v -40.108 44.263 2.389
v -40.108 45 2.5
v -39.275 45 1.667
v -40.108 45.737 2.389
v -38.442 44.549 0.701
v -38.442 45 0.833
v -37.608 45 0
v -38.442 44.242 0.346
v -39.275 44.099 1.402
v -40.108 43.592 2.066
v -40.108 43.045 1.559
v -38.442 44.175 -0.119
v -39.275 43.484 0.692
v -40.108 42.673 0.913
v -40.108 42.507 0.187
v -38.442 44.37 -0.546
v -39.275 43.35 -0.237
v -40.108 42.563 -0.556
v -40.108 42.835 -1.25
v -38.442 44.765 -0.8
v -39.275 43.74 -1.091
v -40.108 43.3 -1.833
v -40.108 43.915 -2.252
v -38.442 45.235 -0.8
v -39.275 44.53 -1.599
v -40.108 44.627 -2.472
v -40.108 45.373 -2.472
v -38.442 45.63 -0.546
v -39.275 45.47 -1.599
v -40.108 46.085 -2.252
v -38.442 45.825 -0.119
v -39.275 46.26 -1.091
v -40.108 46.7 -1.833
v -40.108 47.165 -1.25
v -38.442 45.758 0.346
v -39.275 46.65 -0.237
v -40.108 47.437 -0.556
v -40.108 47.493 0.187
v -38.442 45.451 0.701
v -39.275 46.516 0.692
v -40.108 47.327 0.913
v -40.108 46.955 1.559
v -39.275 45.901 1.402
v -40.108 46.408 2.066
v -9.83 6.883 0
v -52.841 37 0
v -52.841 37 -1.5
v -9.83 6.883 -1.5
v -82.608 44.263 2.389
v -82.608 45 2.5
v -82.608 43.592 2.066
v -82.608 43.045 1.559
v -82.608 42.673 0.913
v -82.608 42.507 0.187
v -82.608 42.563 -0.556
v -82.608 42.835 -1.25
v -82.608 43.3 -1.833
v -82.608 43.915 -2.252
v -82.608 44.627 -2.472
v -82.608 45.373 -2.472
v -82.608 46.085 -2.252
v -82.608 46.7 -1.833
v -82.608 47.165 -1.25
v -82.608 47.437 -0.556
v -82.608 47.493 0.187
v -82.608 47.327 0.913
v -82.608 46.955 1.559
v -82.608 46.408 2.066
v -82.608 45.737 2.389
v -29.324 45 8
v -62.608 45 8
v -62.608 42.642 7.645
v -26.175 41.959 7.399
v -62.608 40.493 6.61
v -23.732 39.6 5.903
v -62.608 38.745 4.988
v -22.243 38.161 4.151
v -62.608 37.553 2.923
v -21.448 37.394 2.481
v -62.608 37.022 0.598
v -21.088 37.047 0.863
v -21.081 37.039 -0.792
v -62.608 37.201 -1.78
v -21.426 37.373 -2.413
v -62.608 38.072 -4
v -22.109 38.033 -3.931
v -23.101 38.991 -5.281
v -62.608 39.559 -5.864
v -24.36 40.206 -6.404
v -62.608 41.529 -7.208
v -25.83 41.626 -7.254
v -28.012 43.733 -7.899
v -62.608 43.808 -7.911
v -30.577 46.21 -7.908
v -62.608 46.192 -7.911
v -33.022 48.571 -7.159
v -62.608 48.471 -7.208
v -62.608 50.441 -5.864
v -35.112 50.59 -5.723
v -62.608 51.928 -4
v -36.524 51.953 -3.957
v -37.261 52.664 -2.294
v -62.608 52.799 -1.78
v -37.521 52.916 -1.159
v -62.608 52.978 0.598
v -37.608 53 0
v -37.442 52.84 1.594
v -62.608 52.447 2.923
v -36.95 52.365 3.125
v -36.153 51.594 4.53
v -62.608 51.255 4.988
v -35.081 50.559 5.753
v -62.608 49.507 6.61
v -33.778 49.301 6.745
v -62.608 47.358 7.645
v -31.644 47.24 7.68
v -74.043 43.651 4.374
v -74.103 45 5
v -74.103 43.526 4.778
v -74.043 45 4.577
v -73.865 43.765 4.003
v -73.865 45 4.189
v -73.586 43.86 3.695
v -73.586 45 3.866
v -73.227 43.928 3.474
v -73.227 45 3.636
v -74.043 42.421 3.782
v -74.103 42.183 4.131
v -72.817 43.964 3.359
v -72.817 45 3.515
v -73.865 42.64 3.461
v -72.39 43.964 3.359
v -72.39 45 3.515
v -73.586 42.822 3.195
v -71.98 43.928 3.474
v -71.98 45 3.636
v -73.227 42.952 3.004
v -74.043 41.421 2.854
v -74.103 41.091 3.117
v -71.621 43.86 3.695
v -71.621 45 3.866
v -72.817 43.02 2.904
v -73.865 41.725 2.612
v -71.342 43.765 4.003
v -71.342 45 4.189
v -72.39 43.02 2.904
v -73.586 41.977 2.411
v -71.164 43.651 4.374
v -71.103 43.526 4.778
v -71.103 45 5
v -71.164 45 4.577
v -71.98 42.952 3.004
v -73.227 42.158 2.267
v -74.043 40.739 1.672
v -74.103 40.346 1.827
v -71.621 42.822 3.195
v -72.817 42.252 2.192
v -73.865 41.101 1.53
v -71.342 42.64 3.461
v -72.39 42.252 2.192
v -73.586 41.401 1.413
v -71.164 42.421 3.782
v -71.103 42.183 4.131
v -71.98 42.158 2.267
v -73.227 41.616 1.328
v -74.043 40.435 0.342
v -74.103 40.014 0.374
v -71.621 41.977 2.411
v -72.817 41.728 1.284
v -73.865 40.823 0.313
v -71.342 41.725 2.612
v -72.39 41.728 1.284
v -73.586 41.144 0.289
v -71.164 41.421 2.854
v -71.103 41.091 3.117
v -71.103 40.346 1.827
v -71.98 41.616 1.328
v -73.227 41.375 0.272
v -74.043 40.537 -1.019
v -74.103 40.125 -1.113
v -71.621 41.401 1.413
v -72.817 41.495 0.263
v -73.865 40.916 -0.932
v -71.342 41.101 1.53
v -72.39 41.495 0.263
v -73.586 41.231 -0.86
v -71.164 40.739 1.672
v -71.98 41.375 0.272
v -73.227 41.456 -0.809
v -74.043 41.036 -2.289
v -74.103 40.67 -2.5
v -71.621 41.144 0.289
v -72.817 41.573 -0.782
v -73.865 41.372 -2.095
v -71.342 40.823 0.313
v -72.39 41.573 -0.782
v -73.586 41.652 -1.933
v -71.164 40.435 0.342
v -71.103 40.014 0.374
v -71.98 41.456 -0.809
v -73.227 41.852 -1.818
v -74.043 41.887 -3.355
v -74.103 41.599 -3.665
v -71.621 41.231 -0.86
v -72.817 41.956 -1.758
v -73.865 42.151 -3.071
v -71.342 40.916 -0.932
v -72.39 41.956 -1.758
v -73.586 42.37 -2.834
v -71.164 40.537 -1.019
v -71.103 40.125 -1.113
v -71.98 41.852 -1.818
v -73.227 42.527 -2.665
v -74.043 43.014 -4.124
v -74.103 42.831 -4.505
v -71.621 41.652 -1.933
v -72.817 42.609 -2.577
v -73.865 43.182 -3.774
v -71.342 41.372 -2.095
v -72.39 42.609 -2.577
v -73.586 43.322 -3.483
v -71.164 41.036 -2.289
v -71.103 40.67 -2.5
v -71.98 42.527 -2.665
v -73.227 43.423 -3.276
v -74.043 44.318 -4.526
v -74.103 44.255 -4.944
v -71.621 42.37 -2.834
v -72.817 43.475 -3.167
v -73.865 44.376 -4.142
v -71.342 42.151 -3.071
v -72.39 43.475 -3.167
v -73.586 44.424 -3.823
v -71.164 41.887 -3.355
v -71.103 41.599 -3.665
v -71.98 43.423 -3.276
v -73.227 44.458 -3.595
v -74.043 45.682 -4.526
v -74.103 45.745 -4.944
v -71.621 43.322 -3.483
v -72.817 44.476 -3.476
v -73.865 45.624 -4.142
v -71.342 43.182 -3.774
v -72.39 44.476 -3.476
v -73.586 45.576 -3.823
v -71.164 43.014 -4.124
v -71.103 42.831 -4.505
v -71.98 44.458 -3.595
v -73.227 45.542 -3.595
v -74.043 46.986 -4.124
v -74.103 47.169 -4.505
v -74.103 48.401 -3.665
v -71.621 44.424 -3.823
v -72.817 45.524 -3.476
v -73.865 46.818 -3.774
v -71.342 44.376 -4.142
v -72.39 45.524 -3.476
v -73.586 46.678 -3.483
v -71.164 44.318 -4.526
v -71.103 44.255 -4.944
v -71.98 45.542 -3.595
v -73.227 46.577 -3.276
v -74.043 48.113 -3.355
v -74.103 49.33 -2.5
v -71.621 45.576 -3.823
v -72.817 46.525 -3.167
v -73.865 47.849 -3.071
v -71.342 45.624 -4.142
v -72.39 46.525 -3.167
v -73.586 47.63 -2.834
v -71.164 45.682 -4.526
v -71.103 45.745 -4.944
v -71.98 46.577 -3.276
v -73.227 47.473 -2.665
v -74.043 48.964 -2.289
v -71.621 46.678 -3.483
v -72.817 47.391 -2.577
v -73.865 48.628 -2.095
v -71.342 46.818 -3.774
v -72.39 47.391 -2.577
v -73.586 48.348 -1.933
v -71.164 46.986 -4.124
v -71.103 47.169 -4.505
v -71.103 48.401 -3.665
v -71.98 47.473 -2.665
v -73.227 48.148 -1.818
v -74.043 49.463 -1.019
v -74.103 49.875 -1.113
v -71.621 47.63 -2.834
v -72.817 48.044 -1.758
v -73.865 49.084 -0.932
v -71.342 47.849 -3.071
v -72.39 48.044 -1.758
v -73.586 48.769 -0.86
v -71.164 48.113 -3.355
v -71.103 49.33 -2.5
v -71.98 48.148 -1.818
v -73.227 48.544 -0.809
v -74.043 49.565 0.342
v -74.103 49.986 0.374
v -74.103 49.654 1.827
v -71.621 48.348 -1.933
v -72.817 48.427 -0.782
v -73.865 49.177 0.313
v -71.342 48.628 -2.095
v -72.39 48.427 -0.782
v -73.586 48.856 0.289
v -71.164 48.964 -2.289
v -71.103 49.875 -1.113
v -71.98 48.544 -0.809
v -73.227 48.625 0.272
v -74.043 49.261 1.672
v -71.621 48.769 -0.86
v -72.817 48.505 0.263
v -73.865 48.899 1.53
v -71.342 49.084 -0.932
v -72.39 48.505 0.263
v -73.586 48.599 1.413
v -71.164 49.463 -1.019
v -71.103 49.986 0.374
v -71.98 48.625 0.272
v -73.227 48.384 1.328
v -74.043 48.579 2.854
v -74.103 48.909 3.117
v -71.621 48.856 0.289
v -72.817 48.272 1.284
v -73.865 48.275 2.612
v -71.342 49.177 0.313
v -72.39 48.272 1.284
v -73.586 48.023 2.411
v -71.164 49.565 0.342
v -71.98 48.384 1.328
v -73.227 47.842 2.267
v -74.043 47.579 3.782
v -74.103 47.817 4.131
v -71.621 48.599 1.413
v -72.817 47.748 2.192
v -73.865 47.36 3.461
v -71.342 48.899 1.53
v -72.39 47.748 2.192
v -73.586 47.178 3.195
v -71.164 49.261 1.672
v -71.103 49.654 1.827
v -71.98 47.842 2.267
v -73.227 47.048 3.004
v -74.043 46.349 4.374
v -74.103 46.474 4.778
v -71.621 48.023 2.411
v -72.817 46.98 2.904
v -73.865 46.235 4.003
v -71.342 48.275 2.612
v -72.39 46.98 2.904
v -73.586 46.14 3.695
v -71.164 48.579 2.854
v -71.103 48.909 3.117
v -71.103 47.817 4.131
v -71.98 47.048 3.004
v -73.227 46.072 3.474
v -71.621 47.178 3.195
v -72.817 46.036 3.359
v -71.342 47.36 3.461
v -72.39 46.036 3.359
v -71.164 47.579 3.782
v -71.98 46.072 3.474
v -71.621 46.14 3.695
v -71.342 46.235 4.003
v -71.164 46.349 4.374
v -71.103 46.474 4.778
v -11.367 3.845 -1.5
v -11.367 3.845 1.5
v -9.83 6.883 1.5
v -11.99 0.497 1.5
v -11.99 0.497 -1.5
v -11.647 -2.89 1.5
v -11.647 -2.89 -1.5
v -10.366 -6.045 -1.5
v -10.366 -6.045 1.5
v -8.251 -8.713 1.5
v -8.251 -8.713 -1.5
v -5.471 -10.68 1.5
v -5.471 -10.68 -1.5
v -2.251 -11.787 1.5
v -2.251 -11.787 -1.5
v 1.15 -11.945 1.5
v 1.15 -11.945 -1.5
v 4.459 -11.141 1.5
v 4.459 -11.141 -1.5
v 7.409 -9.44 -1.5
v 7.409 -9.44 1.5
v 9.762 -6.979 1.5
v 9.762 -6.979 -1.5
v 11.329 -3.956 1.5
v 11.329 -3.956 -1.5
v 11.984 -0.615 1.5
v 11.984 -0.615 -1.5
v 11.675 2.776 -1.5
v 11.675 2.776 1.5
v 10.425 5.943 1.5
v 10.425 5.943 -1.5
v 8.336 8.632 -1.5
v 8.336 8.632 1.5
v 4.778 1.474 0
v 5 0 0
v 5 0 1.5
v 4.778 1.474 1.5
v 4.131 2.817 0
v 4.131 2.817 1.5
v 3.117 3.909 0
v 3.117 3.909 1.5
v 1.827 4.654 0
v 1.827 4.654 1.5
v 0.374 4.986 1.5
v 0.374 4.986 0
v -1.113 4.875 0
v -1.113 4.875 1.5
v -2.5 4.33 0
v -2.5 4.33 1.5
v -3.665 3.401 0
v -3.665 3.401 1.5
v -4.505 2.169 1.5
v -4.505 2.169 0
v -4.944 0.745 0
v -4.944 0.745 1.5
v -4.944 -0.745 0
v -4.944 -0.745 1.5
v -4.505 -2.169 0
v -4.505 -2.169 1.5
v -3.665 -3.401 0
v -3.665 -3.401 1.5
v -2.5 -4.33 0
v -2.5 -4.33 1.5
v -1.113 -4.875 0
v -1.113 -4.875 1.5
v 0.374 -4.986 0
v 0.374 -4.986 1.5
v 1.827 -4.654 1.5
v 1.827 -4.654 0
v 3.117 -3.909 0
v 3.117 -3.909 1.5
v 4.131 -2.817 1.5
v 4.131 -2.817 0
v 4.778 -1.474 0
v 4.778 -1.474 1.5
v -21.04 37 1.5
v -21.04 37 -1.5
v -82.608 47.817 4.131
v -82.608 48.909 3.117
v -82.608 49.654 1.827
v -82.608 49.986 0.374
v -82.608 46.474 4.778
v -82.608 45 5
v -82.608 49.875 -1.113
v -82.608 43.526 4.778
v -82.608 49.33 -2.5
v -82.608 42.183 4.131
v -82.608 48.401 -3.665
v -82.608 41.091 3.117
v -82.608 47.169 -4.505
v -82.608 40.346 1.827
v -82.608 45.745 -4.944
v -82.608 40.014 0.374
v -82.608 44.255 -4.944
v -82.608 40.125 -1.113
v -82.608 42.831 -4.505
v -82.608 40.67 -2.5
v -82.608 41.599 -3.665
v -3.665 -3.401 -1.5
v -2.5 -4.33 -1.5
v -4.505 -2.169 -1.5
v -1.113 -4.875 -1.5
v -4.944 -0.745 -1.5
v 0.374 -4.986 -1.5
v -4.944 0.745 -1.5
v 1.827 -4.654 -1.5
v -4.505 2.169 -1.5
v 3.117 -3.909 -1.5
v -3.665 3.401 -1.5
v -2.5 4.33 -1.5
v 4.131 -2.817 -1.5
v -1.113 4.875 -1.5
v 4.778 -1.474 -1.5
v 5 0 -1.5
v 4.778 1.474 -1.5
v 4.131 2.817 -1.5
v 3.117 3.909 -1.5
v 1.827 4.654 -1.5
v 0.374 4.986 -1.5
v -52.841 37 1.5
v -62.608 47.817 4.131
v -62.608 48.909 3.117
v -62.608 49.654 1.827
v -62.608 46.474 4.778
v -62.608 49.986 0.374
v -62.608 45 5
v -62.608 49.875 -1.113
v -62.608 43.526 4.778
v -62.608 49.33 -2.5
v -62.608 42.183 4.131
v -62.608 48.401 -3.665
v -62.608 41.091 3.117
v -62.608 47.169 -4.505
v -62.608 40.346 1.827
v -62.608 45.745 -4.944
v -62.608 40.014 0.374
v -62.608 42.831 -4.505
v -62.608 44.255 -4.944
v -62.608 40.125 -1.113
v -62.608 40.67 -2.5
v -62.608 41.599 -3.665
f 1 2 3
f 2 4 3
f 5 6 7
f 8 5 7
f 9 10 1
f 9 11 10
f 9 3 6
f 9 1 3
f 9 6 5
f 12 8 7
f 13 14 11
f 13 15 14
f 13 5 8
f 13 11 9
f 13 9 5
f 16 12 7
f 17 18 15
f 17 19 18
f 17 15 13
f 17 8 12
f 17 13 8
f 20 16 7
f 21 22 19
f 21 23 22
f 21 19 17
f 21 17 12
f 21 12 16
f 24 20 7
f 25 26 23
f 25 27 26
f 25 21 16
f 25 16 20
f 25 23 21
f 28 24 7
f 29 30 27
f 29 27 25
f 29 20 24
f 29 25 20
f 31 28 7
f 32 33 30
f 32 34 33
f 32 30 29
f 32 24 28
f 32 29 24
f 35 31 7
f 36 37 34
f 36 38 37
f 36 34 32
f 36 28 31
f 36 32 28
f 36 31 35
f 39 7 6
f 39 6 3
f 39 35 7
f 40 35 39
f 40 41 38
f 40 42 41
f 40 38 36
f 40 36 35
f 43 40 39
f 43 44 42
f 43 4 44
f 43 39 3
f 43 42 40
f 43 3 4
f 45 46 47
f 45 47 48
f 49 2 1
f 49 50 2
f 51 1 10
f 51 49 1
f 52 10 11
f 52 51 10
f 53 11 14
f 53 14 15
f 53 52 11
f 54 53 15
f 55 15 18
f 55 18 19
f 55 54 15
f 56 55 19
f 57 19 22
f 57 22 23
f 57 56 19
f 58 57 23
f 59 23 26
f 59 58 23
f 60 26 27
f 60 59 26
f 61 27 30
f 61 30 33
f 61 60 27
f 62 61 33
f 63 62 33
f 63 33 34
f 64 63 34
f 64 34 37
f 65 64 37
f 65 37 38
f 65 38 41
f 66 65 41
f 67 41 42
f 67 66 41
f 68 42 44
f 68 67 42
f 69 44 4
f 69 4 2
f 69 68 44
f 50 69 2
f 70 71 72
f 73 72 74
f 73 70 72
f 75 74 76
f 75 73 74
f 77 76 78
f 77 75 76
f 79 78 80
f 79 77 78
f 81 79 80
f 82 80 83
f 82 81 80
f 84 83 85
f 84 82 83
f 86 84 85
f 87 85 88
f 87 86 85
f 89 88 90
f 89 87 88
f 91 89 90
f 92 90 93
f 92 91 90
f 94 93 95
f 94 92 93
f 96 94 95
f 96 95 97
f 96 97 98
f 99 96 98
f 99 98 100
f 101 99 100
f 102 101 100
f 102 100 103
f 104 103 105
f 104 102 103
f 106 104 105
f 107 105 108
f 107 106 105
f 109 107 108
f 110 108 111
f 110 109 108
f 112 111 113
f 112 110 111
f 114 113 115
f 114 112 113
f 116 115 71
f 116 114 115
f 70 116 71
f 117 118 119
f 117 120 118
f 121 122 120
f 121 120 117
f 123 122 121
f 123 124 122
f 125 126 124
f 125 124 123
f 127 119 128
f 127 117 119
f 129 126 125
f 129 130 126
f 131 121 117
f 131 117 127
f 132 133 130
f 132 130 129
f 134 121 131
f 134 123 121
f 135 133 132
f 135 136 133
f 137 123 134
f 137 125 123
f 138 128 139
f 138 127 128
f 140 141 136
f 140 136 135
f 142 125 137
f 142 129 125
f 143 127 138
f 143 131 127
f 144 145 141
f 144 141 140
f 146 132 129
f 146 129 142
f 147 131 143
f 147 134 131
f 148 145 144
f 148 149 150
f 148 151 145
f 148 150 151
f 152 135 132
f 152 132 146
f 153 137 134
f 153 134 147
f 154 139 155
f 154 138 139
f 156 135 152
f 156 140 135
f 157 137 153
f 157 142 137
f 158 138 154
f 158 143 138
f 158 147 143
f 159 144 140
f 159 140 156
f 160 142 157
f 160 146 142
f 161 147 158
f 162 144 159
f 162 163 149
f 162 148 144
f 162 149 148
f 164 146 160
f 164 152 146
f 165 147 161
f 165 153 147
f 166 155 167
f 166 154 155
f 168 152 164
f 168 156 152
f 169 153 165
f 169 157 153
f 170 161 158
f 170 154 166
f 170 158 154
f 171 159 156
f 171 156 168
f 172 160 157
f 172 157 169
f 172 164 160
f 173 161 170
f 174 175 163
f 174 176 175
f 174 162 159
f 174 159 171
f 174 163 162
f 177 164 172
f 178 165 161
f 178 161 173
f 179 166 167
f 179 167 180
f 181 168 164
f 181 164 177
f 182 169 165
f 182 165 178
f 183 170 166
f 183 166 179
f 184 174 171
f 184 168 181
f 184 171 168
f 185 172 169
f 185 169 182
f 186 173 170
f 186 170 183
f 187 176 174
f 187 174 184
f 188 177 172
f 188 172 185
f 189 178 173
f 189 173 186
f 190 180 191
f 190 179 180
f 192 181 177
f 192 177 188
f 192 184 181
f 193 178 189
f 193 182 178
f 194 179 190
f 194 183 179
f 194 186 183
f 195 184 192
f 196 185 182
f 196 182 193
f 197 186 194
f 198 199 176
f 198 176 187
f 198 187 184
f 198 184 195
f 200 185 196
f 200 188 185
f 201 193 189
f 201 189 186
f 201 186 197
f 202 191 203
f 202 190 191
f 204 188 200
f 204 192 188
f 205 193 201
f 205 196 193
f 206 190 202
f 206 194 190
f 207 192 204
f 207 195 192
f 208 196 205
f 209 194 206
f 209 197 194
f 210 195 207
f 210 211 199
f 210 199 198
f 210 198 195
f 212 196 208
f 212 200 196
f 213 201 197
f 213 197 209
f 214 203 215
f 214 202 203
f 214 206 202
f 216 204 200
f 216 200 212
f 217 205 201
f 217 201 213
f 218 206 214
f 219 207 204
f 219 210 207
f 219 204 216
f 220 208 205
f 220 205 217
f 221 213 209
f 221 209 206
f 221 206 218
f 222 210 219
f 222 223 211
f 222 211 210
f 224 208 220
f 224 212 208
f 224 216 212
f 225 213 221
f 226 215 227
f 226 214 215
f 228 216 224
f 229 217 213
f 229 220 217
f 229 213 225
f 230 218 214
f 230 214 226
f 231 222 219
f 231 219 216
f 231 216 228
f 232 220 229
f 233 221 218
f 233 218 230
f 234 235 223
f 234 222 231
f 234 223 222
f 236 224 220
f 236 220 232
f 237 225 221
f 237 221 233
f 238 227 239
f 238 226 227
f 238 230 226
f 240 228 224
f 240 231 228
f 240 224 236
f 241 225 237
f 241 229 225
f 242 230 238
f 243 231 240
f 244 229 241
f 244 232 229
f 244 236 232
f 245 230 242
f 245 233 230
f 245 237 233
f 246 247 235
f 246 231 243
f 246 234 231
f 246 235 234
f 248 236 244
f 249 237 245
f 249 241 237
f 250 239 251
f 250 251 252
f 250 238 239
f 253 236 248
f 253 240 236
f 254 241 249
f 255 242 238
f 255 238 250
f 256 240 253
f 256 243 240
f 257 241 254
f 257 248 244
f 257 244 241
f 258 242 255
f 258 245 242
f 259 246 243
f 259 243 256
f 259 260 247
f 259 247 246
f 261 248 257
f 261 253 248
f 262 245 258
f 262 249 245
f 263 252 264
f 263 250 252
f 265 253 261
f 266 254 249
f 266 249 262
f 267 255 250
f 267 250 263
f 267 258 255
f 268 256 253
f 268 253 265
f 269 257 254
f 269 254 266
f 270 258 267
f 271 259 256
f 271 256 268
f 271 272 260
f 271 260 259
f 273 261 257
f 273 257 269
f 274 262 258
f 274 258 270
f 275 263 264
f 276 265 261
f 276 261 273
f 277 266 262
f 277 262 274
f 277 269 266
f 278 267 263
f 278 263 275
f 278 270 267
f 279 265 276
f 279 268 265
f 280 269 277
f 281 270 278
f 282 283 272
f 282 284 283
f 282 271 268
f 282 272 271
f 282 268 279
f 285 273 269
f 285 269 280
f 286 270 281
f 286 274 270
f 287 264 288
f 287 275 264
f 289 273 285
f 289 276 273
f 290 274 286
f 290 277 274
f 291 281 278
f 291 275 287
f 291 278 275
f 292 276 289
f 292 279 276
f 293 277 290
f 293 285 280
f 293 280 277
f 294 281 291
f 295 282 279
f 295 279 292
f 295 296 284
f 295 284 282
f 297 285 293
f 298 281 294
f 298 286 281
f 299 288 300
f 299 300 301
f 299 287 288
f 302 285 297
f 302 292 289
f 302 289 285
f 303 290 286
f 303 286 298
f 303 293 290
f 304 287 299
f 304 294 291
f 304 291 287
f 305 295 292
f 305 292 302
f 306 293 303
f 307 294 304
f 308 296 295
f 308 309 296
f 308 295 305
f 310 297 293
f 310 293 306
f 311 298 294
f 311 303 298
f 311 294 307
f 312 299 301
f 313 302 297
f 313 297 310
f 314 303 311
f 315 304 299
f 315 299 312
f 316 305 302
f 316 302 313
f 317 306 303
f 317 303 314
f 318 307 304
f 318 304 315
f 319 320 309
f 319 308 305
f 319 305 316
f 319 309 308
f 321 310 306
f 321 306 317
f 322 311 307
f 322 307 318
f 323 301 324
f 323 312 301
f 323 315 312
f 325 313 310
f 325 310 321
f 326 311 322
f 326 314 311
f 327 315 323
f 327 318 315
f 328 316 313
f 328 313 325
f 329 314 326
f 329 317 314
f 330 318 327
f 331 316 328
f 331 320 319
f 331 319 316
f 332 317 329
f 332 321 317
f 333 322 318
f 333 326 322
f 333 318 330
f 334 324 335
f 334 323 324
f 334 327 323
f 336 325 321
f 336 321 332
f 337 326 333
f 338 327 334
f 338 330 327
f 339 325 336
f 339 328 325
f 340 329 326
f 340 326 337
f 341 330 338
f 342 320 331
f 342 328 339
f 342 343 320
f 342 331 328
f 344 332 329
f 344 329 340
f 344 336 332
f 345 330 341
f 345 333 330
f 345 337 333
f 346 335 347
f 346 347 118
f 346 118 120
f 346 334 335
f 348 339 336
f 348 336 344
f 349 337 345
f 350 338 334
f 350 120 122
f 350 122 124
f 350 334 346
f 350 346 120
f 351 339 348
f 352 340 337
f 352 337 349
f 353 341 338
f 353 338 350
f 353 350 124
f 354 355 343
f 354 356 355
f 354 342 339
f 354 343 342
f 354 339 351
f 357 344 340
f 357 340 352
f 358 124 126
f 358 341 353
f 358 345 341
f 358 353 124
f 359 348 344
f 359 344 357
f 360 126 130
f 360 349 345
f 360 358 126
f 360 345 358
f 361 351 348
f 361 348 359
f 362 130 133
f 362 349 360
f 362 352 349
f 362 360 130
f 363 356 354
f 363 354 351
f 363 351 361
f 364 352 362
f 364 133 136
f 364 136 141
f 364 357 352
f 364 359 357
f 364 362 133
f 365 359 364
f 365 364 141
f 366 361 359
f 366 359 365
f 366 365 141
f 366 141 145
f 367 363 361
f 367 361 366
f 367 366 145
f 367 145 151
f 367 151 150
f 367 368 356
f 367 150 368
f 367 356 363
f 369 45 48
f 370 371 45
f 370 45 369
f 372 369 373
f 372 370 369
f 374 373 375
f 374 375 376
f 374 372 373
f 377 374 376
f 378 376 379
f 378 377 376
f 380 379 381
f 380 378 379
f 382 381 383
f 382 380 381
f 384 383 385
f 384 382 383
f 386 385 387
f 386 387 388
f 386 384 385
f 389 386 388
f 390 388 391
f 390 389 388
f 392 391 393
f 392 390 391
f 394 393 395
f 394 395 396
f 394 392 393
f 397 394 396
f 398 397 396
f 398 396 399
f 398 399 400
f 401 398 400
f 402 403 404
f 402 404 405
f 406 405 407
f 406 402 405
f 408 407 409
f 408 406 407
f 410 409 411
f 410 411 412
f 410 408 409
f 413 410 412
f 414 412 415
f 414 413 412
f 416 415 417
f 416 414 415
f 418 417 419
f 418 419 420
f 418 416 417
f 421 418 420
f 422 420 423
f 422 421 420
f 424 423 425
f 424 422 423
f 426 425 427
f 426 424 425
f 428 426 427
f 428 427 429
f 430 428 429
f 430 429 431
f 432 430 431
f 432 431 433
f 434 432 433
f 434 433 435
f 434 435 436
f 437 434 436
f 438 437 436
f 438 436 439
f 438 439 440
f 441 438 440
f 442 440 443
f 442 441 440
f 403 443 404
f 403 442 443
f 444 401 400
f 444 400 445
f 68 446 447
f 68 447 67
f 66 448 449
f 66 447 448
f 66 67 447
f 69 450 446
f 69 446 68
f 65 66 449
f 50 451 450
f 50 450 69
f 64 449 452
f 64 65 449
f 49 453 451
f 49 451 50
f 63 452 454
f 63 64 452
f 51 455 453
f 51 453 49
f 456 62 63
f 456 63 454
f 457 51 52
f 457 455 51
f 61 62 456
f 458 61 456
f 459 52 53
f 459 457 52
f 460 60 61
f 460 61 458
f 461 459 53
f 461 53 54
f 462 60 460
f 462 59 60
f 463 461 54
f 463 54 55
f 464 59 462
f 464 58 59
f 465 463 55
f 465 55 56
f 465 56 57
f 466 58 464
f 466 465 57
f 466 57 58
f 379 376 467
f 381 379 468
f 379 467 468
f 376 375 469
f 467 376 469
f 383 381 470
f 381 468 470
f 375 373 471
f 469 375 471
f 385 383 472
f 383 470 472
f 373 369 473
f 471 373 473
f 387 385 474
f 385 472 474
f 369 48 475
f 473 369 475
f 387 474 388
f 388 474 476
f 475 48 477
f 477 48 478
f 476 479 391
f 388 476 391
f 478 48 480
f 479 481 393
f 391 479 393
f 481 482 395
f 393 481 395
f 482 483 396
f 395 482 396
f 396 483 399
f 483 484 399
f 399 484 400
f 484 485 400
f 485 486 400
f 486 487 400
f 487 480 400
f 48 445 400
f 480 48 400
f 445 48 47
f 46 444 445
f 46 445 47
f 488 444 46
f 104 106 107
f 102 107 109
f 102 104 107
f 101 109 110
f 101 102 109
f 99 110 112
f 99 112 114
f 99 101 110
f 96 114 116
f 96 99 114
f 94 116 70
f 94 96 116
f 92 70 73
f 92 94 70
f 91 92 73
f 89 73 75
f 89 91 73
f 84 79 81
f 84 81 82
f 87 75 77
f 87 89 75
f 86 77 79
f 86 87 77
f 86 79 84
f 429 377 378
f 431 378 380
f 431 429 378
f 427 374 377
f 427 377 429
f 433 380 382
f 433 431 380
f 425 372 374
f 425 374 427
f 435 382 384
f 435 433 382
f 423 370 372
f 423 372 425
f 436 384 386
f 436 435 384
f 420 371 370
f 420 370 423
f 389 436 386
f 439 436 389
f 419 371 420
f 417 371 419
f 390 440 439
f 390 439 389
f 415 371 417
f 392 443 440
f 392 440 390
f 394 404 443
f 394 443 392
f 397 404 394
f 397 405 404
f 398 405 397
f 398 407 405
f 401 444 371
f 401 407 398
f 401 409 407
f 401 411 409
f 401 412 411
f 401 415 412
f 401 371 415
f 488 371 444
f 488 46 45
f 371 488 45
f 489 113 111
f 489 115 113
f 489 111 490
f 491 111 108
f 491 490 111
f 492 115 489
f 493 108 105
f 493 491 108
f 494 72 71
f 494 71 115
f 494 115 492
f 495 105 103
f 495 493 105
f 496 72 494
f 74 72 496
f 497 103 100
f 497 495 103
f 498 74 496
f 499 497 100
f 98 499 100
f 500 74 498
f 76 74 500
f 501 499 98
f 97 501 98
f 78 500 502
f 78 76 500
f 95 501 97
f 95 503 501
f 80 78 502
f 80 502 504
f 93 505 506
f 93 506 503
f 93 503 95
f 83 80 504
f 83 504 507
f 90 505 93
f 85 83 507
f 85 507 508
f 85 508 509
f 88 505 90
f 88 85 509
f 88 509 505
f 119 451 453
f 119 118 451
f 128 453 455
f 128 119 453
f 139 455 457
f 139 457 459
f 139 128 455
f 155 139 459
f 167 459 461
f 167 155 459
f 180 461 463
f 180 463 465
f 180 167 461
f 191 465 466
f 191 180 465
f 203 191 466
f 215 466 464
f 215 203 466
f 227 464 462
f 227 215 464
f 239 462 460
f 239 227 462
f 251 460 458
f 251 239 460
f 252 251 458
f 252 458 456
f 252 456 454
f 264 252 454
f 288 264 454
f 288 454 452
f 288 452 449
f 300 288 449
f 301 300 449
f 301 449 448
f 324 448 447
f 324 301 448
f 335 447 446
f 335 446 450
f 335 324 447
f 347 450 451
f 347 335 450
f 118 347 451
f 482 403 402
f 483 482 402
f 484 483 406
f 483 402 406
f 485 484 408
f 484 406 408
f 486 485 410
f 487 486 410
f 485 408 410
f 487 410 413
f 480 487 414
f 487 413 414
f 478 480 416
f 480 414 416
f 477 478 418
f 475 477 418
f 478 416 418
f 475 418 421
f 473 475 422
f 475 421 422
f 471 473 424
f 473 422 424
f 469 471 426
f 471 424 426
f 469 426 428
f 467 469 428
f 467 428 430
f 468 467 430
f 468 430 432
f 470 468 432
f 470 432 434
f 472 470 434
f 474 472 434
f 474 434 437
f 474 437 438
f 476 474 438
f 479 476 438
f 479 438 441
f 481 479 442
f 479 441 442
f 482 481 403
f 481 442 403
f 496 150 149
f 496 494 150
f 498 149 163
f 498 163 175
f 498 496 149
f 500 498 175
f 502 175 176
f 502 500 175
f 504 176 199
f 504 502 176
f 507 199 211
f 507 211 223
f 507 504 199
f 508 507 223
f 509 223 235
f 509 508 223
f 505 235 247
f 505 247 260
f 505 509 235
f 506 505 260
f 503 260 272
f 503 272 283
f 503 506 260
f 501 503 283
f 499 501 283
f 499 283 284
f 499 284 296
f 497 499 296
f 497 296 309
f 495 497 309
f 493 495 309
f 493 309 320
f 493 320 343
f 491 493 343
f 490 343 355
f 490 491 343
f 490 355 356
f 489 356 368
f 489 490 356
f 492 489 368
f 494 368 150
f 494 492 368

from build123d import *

# Parameters (mm, degrees)
CUT_EXTRUDE_1_DEPTH      = 99.47412047
CUT_EXTRUDE_1_DEPTH_BACK = 99.47412047
SKETCH_3_R               = 12
SKETCH_3_R_2             = 5
EXTRUDE_1_DEPTH          = 1.5


with BuildPart() as part:
    # 草图1 → 旋转1 (revolve)
    with BuildSketch(Plane.XY, mode=Mode.PRIVATE) as revolve_1_sk:
        with BuildLine():
            Line((-82.608428155, 45), (-82.608428155, 50))
            Line((-82.608428155, 50), (-74.103486012, 50))
            ThreePointArc((-74.103486012, 50), (-72.603486012, 48.5), (-71.103486012, 50))
            Line((-71.103486012, 50), (-62.608428155, 50))
            Line((-62.608428155, 50), (-62.608428155, 53))
            Line((-62.608428155, 53), (-20.871531074, 53))
            Line((-20.871531074, 53), (-20.871531074, 45))
            Line((-20.871531074, 45), (-82.608428155, 45))
        make_face()
    revolve(revolve_1_sk.sketch.rotate(Axis((-114.703915619, 45, 0), (1, 0, 0)), 90), axis=Axis((-114.703915619, 45, 0), (1, 0, 0)))

    # 草图2 → 切除-拉伸1 (cut, two sides: drawn at the far end of the back side and taken through both)
    with BuildSketch(Plane.XY.offset(-CUT_EXTRUDE_1_DEPTH_BACK)):
        Polygon((-190.381582795, 200.531320527), (-37.608428155, 53), (8.335900446, 8.632077604), (161.109055085, -138.899242923), (456.171696139, 166.647066356), (104.681058259, 506.077629806), align=None)
    extrude(amount=CUT_EXTRUDE_1_DEPTH + CUT_EXTRUDE_1_DEPTH_BACK, mode=Mode.SUBTRACT)

    # 草图7 → 大小mm 暗销孔2 (revolve, cut)
    with BuildSketch(Plane(origin=(-82.608428155, 45, 0), x_dir=(0, 0, 1), z_dir=(0, 1, 0))):
        Polygon((0, 0), (0, 45), (2.5, 42.5), (2.5, 0), align=None)
    revolve(axis=Axis((-88.958428155, 45, 0), (1, 0, 0)), mode=Mode.SUBTRACT)


with BuildPart() as body_2:
    # 草图3 → 凸台-拉伸1 (new, symmetric)
    # profile 1 of 2: a face of its own
    with BuildSketch(Plane.XY):
        with BuildLine():
            Line((8.335900446, 8.632077604), (-21.039943135, 37))
            Line((-21.039943135, 37), (-52.841476249, 37))
            Line((-52.841476249, 37), (-9.829824531, 6.882917236))
            ThreePointArc((-9.829824531, 6.882917236), (-1.15014903, 11.94475438), (8.335900446, 8.632077604))
        make_face()
    # profile 2 of 2: a face of its own
    with BuildSketch(Plane.XY):
        Circle(SKETCH_3_R)
        Circle(SKETCH_3_R_2, mode=Mode.SUBTRACT)
    extrude(amount=EXTRUDE_1_DEPTH, both=True)


solid = Compound([part.part, body_2.part])
